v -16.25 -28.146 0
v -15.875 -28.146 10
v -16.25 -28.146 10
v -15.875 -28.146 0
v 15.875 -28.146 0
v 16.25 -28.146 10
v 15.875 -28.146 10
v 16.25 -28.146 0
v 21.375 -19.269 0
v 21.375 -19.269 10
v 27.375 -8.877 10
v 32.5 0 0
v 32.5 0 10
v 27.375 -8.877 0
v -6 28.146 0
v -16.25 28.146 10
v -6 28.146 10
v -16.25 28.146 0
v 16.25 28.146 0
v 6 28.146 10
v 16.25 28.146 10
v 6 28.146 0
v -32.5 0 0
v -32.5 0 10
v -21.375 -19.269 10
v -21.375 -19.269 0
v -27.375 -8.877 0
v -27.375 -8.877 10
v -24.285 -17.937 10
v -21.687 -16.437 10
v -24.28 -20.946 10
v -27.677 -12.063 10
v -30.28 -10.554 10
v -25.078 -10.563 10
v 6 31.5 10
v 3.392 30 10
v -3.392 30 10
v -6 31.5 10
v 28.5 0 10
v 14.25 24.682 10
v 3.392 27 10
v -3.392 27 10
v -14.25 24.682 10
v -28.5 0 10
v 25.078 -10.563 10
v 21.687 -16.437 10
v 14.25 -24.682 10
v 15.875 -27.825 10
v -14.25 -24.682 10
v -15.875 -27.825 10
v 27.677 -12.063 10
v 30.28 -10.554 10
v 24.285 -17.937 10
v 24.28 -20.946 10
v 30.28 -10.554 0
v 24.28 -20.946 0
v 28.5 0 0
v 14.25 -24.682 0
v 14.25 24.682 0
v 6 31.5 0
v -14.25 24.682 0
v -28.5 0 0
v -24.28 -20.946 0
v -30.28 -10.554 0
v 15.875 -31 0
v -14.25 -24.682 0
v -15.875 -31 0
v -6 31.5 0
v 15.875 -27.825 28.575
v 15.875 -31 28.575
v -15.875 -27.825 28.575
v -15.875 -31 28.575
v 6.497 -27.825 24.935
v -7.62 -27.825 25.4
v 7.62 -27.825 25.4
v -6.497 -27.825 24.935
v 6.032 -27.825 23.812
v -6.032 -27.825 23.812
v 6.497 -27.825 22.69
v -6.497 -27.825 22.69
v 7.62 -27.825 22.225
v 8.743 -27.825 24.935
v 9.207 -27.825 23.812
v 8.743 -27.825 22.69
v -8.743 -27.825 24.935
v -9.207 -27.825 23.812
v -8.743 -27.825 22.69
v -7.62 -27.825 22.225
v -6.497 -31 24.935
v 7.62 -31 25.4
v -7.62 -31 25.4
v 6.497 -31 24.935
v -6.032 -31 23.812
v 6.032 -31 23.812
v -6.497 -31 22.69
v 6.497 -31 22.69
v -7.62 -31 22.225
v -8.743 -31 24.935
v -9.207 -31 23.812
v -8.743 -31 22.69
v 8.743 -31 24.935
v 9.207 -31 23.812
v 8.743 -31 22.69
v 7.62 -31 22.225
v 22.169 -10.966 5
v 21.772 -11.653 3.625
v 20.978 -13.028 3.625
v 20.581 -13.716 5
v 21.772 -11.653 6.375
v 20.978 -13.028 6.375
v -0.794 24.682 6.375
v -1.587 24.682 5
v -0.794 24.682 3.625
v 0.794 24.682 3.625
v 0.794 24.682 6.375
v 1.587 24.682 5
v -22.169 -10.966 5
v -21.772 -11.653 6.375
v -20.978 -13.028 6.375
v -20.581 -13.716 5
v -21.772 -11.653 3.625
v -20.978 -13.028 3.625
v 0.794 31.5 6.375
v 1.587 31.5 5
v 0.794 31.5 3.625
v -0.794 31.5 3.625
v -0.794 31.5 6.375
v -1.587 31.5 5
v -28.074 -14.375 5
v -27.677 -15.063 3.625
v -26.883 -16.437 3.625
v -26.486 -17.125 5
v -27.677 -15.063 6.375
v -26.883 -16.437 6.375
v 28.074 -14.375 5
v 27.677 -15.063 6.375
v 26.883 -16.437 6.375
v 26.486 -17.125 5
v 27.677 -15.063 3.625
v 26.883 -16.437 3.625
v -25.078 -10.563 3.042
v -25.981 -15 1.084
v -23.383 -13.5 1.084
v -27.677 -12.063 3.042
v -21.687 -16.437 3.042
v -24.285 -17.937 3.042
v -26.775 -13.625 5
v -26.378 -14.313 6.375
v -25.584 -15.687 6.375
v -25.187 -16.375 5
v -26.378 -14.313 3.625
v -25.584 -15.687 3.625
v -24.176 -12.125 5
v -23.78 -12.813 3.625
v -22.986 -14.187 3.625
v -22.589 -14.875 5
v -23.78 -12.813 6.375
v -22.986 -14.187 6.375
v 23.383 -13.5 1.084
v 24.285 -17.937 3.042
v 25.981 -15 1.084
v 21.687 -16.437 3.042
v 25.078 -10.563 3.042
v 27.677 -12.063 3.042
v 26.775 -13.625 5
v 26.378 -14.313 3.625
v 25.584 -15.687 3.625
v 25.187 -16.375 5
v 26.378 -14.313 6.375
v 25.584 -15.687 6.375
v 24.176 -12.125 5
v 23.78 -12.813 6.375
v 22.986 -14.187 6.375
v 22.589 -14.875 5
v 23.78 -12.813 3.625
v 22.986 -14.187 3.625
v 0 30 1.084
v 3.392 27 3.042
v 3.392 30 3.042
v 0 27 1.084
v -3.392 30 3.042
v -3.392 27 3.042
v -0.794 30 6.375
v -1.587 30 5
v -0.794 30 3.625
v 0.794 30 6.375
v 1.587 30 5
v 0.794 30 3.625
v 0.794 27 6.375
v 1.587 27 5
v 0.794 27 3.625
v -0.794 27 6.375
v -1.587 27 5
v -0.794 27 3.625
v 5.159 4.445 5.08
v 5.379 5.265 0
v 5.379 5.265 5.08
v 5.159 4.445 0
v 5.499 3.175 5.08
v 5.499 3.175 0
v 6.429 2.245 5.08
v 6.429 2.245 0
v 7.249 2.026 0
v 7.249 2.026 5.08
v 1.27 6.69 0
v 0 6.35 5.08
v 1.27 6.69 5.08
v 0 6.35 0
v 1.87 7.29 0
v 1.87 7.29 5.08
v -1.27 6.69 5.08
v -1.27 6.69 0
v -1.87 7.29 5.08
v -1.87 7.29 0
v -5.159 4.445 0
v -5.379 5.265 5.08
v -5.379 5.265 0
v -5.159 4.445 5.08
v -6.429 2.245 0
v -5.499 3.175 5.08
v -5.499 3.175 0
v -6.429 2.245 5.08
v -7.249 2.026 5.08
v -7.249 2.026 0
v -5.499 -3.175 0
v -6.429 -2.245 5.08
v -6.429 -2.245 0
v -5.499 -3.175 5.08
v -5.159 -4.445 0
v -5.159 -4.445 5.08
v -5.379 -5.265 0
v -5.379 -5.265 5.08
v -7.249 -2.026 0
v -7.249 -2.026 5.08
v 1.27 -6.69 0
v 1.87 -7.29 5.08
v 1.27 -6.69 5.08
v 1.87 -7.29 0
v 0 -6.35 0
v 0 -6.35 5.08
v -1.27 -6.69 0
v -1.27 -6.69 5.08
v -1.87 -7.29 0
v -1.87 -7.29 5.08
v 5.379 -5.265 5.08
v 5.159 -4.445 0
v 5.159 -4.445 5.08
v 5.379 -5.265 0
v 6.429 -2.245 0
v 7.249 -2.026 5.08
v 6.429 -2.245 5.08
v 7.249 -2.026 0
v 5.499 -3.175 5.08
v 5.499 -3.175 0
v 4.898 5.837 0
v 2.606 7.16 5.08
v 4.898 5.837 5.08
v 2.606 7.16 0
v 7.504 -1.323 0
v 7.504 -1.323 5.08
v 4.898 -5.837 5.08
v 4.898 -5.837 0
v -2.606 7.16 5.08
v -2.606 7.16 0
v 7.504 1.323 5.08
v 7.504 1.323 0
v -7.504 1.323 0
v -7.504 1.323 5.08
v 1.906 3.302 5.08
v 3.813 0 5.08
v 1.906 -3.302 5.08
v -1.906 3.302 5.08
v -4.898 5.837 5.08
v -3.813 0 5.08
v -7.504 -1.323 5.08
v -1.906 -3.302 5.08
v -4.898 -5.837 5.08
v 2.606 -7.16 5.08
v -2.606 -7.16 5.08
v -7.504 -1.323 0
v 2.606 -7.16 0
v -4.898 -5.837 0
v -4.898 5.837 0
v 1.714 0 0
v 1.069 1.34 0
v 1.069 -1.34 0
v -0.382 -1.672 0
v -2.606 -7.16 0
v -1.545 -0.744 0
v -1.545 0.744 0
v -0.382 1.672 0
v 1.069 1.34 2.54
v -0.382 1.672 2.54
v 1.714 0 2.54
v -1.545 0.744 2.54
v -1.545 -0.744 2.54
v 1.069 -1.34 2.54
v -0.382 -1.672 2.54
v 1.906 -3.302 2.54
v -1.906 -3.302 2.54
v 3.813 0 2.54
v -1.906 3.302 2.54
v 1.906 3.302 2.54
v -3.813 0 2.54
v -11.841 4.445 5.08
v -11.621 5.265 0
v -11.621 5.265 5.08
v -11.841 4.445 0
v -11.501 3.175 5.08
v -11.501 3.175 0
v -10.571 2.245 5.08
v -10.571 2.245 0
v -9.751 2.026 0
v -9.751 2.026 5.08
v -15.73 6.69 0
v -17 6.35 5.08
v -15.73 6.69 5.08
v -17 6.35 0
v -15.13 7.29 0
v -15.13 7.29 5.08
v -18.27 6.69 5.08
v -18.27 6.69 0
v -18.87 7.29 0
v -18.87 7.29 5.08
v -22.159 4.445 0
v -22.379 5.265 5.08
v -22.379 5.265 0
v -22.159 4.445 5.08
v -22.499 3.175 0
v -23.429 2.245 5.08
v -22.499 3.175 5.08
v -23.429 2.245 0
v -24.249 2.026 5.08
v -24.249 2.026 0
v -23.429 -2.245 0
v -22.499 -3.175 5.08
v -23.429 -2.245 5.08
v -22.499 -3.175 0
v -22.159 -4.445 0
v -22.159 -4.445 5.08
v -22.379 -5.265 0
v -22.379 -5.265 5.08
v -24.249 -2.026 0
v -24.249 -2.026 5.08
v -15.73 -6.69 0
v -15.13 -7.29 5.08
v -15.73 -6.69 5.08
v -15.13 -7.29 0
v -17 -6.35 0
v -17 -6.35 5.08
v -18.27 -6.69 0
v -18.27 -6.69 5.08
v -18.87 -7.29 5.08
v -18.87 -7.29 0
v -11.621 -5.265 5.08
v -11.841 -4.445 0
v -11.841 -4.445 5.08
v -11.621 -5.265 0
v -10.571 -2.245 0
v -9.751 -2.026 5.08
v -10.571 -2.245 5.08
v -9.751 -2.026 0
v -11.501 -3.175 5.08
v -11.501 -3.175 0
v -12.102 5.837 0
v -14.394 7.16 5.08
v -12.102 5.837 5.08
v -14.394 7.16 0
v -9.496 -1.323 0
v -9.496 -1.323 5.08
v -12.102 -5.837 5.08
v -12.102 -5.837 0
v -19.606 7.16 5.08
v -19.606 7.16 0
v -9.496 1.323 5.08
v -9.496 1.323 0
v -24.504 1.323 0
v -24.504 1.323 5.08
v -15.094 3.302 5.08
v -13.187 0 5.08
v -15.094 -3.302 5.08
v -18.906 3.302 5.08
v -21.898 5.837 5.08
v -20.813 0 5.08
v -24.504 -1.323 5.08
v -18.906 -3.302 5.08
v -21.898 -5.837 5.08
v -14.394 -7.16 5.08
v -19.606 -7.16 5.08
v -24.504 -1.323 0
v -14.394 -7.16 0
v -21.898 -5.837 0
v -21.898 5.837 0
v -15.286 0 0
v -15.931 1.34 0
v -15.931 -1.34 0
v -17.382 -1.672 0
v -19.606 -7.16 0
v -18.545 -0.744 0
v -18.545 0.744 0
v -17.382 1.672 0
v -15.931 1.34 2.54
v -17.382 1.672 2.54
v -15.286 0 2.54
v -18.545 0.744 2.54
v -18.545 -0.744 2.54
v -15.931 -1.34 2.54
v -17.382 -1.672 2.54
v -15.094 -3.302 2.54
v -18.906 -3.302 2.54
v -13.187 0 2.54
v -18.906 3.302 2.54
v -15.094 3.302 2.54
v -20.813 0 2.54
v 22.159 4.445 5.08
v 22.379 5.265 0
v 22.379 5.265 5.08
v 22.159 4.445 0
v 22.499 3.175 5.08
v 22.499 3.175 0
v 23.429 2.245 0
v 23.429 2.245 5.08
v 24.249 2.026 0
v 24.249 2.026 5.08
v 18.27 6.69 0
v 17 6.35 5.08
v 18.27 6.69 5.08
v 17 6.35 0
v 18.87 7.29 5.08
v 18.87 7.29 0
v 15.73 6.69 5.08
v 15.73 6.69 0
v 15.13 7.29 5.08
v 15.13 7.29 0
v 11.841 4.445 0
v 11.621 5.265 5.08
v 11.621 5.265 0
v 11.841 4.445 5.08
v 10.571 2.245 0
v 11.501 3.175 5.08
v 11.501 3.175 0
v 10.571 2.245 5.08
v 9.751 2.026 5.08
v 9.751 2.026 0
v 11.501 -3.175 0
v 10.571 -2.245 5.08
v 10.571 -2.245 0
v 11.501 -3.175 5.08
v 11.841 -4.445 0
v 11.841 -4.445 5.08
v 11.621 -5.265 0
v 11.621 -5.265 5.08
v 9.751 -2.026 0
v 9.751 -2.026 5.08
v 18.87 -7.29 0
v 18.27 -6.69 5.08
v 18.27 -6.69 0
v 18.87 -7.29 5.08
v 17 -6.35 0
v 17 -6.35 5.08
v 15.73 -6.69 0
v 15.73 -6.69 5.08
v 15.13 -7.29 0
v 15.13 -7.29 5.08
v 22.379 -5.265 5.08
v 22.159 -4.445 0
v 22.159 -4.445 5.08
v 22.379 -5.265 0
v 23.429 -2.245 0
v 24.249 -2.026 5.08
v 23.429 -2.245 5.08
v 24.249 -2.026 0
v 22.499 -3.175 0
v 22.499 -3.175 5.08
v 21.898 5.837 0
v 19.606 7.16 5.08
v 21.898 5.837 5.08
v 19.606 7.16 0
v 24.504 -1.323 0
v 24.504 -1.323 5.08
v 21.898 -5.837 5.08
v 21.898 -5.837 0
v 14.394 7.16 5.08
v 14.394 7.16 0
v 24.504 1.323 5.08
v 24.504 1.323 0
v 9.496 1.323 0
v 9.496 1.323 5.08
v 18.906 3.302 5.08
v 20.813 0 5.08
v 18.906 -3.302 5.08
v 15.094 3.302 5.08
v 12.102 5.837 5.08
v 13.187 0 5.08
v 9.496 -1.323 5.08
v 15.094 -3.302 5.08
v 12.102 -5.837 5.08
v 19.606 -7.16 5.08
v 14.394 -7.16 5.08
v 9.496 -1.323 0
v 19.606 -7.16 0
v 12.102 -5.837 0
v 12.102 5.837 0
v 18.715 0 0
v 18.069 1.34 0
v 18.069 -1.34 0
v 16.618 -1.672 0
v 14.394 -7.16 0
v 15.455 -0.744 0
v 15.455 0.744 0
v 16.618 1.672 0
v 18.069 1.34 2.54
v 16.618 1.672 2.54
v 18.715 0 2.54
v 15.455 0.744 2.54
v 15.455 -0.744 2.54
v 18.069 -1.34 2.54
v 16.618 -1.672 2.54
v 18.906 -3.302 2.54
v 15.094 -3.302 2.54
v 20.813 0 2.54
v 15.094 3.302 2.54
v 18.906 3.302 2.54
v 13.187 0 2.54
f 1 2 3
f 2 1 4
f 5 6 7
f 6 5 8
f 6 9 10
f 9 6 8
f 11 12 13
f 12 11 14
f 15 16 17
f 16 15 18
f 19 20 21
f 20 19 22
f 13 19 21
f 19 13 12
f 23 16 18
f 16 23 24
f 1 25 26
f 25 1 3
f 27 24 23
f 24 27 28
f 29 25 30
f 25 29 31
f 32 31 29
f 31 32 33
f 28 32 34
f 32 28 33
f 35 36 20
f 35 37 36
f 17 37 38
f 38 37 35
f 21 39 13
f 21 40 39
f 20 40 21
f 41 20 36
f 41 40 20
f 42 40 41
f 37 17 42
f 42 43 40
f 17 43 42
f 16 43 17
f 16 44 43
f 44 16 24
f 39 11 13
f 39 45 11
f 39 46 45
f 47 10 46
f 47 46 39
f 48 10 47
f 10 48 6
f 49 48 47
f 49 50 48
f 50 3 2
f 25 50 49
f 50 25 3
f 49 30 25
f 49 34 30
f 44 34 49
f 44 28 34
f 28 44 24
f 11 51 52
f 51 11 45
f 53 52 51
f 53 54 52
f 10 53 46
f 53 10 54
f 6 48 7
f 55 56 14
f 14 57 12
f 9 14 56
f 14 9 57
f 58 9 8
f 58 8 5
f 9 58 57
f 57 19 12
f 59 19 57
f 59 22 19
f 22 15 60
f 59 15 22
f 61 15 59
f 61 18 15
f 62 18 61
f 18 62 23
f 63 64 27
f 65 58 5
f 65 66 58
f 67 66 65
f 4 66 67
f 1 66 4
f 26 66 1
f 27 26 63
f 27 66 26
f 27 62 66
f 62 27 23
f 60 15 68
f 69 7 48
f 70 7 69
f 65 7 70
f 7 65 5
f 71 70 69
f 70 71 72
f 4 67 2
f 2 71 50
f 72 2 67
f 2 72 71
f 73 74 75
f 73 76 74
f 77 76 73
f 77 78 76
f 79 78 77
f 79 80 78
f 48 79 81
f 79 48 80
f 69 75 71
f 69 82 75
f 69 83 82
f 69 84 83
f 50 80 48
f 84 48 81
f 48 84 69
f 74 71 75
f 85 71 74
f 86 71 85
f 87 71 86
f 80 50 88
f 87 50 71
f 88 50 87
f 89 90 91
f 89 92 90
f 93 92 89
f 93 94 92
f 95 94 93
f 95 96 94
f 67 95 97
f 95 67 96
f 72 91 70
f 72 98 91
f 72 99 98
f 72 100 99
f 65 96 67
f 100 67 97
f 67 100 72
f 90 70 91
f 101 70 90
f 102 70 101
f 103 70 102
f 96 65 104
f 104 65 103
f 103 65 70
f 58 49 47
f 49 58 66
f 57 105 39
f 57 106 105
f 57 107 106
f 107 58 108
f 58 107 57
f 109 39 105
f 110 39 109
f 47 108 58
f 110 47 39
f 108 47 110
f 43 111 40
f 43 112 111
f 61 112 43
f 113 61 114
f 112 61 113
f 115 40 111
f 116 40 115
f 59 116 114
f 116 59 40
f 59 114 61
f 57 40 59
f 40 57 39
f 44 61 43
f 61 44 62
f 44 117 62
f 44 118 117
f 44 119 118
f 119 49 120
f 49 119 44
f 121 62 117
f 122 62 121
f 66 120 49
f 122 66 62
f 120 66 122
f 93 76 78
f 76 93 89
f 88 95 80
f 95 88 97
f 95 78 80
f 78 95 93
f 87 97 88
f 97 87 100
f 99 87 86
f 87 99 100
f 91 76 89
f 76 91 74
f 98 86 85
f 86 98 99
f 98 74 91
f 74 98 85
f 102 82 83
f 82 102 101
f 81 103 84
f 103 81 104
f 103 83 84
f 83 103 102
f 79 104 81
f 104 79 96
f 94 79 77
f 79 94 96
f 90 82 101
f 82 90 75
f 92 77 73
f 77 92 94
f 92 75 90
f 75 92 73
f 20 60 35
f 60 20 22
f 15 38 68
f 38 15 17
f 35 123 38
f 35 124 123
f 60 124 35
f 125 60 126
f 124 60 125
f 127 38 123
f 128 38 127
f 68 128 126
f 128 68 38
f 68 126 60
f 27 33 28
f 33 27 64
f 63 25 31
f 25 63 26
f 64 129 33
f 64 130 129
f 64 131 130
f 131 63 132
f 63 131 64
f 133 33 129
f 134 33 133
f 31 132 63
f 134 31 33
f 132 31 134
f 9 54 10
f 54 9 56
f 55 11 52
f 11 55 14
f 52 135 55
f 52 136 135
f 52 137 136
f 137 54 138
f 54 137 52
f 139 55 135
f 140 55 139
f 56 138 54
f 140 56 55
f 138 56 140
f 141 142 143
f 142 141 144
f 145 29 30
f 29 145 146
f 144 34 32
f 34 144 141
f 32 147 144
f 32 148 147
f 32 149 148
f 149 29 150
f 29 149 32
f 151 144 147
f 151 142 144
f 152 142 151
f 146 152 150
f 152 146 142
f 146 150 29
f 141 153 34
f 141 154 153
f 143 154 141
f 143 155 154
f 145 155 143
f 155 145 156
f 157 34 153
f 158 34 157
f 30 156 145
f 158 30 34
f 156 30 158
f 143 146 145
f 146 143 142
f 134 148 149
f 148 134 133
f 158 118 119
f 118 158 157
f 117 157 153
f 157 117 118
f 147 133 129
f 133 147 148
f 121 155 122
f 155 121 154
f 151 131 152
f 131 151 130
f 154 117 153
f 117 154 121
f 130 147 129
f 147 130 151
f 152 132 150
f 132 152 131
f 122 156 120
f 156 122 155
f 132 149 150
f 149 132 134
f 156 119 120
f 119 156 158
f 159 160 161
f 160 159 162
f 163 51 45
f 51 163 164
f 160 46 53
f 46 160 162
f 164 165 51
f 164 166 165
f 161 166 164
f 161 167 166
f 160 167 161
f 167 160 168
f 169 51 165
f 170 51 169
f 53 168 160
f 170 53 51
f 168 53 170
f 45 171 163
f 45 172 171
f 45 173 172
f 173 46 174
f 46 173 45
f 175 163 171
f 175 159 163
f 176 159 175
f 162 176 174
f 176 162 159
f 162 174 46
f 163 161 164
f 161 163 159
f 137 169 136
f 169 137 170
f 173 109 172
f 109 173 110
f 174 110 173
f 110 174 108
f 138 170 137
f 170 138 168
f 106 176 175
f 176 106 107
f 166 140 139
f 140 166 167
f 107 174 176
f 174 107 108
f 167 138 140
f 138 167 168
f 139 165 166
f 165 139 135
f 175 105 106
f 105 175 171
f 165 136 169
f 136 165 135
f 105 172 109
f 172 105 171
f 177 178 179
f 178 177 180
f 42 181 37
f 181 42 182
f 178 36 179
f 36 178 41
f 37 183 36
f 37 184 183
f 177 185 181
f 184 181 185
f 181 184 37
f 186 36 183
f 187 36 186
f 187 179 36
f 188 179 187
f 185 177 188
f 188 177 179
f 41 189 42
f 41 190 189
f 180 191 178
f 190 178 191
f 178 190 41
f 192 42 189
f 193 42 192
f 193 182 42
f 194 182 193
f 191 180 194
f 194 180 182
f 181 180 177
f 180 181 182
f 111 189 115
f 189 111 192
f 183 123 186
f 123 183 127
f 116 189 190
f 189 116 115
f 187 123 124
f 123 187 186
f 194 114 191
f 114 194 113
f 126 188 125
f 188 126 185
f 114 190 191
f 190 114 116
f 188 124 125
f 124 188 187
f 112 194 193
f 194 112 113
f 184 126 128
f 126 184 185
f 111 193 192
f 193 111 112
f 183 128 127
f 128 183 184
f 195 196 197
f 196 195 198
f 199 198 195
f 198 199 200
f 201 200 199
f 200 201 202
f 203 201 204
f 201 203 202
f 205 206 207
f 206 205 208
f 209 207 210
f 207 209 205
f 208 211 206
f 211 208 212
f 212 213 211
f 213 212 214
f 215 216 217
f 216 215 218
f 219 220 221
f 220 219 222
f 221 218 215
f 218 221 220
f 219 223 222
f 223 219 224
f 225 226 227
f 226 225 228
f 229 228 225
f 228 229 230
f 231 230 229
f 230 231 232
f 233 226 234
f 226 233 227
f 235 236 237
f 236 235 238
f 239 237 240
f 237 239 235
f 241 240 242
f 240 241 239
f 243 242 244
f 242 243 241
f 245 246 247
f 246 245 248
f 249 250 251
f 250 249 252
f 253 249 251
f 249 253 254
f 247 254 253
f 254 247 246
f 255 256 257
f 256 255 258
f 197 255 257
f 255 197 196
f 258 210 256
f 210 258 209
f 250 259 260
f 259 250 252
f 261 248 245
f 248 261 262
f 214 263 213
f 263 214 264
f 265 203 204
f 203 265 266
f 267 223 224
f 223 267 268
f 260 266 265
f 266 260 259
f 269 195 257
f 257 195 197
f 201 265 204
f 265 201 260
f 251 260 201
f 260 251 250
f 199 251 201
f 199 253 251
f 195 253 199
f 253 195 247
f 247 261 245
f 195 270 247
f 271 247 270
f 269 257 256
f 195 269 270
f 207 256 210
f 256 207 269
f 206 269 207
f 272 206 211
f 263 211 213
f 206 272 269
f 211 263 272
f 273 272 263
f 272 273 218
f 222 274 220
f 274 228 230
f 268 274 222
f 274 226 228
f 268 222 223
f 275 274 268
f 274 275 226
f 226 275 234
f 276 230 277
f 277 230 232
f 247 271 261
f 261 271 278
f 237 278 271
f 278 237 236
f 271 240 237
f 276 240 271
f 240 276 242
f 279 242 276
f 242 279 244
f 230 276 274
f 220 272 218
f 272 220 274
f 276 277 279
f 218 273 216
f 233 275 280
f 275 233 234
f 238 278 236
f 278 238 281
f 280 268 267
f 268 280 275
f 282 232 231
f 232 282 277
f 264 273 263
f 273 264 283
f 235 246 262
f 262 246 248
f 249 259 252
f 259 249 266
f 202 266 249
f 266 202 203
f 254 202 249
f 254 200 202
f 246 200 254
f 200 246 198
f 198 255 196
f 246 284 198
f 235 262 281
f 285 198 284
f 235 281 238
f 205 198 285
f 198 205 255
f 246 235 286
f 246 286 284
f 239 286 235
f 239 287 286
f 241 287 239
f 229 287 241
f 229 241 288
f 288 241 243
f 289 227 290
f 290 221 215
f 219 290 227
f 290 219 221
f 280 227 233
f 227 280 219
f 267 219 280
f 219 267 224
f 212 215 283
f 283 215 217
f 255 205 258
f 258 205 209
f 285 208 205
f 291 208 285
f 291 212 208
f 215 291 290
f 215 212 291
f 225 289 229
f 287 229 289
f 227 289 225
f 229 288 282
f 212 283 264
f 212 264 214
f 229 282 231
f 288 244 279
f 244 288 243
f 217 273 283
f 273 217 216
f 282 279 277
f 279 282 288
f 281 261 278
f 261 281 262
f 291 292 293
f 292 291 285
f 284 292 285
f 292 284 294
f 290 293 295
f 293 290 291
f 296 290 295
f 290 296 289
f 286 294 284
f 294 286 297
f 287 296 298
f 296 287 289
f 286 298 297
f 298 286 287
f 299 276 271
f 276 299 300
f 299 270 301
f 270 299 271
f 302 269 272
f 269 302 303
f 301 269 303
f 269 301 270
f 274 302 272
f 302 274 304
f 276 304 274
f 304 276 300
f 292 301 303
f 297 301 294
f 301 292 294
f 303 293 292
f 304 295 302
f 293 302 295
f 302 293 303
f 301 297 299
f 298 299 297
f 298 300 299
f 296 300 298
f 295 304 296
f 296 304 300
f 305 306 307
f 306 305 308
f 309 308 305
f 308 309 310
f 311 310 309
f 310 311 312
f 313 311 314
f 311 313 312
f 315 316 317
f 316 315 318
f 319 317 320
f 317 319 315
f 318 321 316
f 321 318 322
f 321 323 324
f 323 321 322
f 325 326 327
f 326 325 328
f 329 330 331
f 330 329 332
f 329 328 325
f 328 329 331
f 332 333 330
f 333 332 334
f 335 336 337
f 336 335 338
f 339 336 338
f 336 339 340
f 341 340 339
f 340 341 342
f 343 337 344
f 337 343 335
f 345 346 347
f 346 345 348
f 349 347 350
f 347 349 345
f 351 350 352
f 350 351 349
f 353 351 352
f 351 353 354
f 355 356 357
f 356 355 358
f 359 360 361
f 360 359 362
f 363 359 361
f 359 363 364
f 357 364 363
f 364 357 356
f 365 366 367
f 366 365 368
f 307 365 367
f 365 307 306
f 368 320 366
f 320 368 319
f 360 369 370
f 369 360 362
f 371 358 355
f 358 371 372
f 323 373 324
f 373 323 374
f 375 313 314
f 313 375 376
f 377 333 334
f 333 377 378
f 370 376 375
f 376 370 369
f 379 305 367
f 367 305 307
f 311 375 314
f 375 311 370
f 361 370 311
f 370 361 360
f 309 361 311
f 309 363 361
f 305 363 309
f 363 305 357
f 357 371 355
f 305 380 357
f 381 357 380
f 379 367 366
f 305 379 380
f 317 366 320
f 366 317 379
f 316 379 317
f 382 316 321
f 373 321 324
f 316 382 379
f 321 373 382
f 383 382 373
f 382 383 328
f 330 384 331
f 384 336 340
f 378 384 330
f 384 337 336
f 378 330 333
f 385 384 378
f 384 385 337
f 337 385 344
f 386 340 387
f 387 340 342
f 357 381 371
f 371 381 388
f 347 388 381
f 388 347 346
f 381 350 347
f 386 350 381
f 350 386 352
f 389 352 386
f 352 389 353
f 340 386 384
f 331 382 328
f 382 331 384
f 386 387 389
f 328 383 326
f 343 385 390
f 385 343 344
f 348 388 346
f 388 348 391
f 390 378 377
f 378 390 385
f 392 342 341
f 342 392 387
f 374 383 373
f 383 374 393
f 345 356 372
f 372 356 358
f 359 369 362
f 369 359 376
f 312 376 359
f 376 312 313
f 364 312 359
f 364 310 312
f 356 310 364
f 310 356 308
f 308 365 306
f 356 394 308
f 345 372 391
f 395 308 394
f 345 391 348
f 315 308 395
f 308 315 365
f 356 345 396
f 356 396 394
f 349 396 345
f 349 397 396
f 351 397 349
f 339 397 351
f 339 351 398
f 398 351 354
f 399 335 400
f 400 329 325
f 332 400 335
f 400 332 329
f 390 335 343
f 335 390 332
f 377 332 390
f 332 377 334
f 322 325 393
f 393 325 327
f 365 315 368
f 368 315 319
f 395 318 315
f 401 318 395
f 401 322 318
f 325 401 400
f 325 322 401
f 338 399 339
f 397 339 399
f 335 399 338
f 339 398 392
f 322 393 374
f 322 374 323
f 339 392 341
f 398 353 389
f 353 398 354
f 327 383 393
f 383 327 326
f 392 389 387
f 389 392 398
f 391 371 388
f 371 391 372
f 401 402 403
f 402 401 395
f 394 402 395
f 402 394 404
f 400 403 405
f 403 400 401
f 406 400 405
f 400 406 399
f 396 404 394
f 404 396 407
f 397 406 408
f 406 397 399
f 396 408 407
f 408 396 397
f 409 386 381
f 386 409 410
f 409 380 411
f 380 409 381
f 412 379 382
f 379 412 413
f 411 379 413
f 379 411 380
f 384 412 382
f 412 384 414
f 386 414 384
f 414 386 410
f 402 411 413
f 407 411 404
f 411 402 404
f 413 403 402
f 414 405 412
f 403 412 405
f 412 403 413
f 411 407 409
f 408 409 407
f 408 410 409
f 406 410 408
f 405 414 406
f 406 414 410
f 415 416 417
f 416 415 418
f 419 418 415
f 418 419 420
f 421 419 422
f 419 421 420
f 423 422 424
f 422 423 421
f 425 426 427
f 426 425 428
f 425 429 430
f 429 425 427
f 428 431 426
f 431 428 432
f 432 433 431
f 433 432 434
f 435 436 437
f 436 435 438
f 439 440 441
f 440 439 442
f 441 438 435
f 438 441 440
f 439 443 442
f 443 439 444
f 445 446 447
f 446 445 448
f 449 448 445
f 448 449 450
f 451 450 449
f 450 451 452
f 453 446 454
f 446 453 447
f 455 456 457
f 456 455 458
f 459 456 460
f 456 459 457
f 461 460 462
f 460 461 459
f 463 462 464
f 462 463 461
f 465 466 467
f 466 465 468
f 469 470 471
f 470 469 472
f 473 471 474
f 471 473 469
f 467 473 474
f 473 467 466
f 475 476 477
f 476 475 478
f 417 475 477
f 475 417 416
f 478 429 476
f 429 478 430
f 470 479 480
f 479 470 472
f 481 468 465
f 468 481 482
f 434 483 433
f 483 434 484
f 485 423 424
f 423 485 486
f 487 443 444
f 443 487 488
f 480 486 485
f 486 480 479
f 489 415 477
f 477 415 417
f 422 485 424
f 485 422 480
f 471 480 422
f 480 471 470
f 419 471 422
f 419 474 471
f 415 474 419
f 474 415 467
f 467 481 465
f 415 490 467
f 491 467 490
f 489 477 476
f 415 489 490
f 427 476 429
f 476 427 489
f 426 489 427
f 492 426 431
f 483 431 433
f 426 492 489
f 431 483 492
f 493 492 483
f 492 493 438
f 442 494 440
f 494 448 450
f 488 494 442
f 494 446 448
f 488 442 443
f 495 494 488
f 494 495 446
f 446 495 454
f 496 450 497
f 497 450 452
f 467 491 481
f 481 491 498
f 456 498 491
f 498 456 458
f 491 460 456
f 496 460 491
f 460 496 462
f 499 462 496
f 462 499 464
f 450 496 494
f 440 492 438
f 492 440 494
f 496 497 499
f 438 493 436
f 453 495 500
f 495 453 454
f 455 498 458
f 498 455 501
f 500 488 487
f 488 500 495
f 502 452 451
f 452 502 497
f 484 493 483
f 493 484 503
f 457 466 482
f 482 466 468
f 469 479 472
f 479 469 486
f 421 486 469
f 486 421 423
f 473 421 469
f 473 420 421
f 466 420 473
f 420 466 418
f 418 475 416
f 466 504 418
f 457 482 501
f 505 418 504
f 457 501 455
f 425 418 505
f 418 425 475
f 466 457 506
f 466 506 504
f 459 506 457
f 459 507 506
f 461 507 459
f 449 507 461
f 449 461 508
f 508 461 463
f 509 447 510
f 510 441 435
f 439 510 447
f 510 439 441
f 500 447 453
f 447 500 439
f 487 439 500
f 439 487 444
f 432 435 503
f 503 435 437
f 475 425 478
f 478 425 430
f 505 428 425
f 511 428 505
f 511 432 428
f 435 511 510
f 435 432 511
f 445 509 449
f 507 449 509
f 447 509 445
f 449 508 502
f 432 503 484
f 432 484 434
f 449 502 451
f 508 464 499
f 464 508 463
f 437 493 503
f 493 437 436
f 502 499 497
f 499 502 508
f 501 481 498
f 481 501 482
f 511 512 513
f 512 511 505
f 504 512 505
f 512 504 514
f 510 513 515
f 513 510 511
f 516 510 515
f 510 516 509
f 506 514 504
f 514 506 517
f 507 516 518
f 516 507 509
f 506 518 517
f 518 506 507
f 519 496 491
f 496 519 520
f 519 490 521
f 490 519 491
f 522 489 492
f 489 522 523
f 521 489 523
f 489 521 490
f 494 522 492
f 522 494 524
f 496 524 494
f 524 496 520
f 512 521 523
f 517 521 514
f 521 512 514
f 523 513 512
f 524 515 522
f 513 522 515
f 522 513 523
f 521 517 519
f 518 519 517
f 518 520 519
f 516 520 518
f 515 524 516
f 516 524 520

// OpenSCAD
// file: thumbscrew.scad
//
// thumbscrew cap for #6-32 nut (5/16 wrench)
//
use <utils.scad>;
epsilon = 1;

module thumbscrew(size = "#6-32", height = -1)
{

  epsilon = 1;
  major_diam_table = [["#4-40", inch(0.6)],
                      ["#6-32", inch(0.6)]];                      
  thumbscrew_knurl_diameter_table = [["#4-40", inch(0.7)],
                                     ["#6-32", inch(0.7)]];
  thumbscrew_knurl_size_table = [["#4-40", inch(0.1)],
                                 ["#6-32", inch(0.1)]];
  thumbscrew_num_knurls_table = [["#4-40", 6],
                                 ["#6-32", 6]];
  thumbscrew_height_table = [["#4-40", inch(0.2)],
                             ["#6-32", inch(0.2)]];
  thumbscrew_base_thickness_table = [["#4-40", inch(0.1)],
                                     ["#6-32", inch(0.075)]];
  thumbscrew_wrench_size_table = [["#4-40", inch(1/4)],
                                  ["#6-32", inch(5/16)]];
  thumbscrew_wrench_tol_table = [["#4-40", inch(0.01)],
                                 ["#6-32", inch(0.01)]];
  screw_clearance_diameter_table = [["#4-40", inch(0.135)],
                                    ["#6-32", inch(0.165)]];


  thumbscrew_diameter = 
    major_diam_table[search([size], major_diam_table)[0]][1];

  thumbscrew_knurl_diameter =
    thumbscrew_knurl_diameter_table[search([size],
                                           thumbscrew_knurl_diameter_table)[0]][1];

  thumbscrew_knurl_size = 
    thumbscrew_knurl_size_table[search([size],
                                       thumbscrew_knurl_size_table)[0]][1];
  thumbscrew_num_knurls =
    thumbscrew_num_knurls_table[search([size],
                                       thumbscrew_num_knurls_table)[0]][1];
  thumbscrew_height = (height > 0) ? height :
    thumbscrew_height_table[search([size],
                                   thumbscrew_height_table)[0]][1];
  thumbscrew_base_thickness =
    thumbscrew_base_thickness_table[search([size],
                                           thumbscrew_base_thickness_table)[0]][1];
  thumbscrew_wrench_size =
    thumbscrew_wrench_size_table[search([size],
                                        thumbscrew_wrench_size_table)[0]][1];
  thumbscrew_wrench_tol =
    thumbscrew_wrench_tol_table[search([size],
                                       thumbscrew_wrench_tol_table)[0]][1];
  screw_clearance_diameter = 
    screw_clearance_diameter_table[search([size],
                                          screw_clearance_diameter_table)[0]][1];

  // calculation based on hex-shaped nut
  thumbscrew_nut_diameter = (thumbscrew_wrench_size +
                             thumbscrew_wrench_tol) / cos(30);

  difference()
  {
    // main body
    rotate([0, 0, 180/thumbscrew_num_knurls])
    {
      cylinder($fn=thumbscrew_num_knurls*3,
               r=thumbscrew_diameter/2,
               h=thumbscrew_height);
    }
    // thru hole
    translate([0, 0, -epsilon])
    {
      cylinder($fn=max(3, round(2*screw_clearance_diameter)),
               r=screw_clearance_diameter/2, h=inch(1));
    }
    // nut recess
    translate([0, 0, thumbscrew_base_thickness])
    {
      cylinder($fn=6, r=thumbscrew_nut_diameter/2, h=inch(1));
    }
    for(i = [0 : thumbscrew_num_knurls-1])
    {
      translate([0.5*thumbscrew_knurl_diameter*
                 cos(30+360*i/thumbscrew_num_knurls),
                 0.5*thumbscrew_knurl_diameter*
                 sin(30+360*i/thumbscrew_num_knurls),
                 -epsilon])
      {
        cylinder($fn=thumbscrew_num_knurls*2,
                 r = thumbscrew_knurl_size, inch(1.0));
      }
    }
  }
}

thumbscrew("#4-40");
// file: utils.scad
//
// general utility functions for OpenSCAD
//
function inch(in) = 25.4*in;
// main file
// ring mount for components
// Copyright (C) 2016, Theodore C Yapo

use <utils.scad>;
use <thumbscrew.scad>;


ring_length = 10;
//center_height = 14.5;
center_height = 31;
//outer_d = 2*center_height / cos(30);
outer_d = 65;
ring_thickness = 4;
inner_d = outer_d - 2*ring_thickness;
screw_spacing = inch(0.6);
base_width = inch(1.25);
base_thickness = inch(0.125);
base_length = inch(1.125);

nut_block_thickness = 6;
nut_block_width = 12;

// recesses for #4-40 hex nuts
nut_d = inch(0.25) / cos(30) + 0.5;
nut_h = 3;

set_screw_d = inch(0.125);

epsilon = 1;

module ring_mount(){
  difference(){
    union(){
      difference(){
        union(){
          //ring body
          cylinder($fn = 6, d = outer_d, h = ring_length);
          // base
          translate([-base_width/2, -center_height, 0]){
            cube([base_width, base_thickness, base_length]);
          }
        }
    
        // hollow inside
        translate([0, 0, -epsilon]){
          cylinder($fn = 6, d = inner_d, h = ring_length + 2*epsilon);
        }
    
        // mounting screw holes
        translate([-inch(0.6)/2,
                   -center_height-epsilon,
                   (base_length - inch(0.75))/2]){
          rotate([-90, 0, 0]){
            *cylinder($fn=8, d = inch(0.125), h = inch(0.25));
          }
        }
        translate([+inch(0.6)/2,
                   -center_height-epsilon,
                   (base_length - inch(0.75))/2]){
          rotate([-90, 0, 0]){
            *cylinder($fn=8, d = inch(0.125), h = inch(0.25));
          }
        }
        translate([-inch(0.6)/2,
                   -center_height - epsilon,
                   base_length - (base_length - inch(0.75))/2]){
          rotate([-90, 0, 0]){
            cylinder($fn=8, d = inch(0.125), h = inch(0.25));
          }
        }
        translate([+inch(0.6)/2,
                   -center_height - epsilon,
                   base_length - (base_length - inch(0.75))/2]){
          rotate([-90, 0, 0]){
            cylinder($fn=8, d = inch(0.125), h = inch(0.25));
          }
        }
      }
  
      // top nut block
      translate([-nut_block_width/2,
                 inner_d/2-nut_block_thickness/2,
                 0]){
        cube([nut_block_width, nut_block_thickness, ring_length]);
      }

      // left nut block
      rotate([0, 0, 120]){
        translate([-nut_block_width/2,
                   inner_d/2-nut_block_thickness/2,
                   0]){
          cube([nut_block_width, nut_block_thickness, ring_length]);
        }
      }

      // right nut block
      rotate([0, 0, -120]){
        translate([-nut_block_width/2,
                   inner_d/2-nut_block_thickness/2,
                   0]){
          cube([nut_block_width, nut_block_thickness, ring_length]);
        }
      }

    }

    // top nut recess
    translate([0,
               inner_d/2-nut_h/2,
               ring_length/2]){
      rotate([-90, 0, 0]){
        hull(){
          rotate([0, 0, 30]){
            cylinder($fn=6, d = nut_d, h = nut_h);
          }
          translate([0, -10, 0]){
            rotate([0, 0, 30]){
              cylinder($fn=6, d = nut_d, h = nut_h);
            }
          }
        }
      }
    }
    // top screw hole
    translate([0,
               inner_d/2 - ring_thickness,
               ring_length/2]){
      rotate([-90, 0, 0]){
        cylinder($fn=6, d = set_screw_d, h = 2*ring_thickness);
      }
    }

    // left nut recess
    rotate([0, 0, 120]){
      translate([0,
                 inner_d/2-nut_h/2,
                 ring_length/2]){
        rotate([-90, 0, 0]){
          hull(){
            rotate([0, 0, 30]){
              cylinder($fn=6, d = nut_d, h = nut_h);
            }
            translate([0, -10, 0]){
              rotate([0, 0, 30]){
                cylinder($fn=6, d = nut_d, h = nut_h);
              }
            }
          }
        }
      }
      // screw hole
      translate([0,
                 inner_d/2 - ring_thickness,
                 ring_length/2]){
        rotate([-90, 0, 0]){
          cylinder($fn=6, d = set_screw_d, h = 2*ring_thickness);
        }
      }
    }

    // right nut recess
    rotate([0, 0, -120]){
      translate([0,
                 inner_d/2-nut_h/2,
                 ring_length/2]){
        rotate([-90, 0, 0]){
          hull(){
            rotate([0, 0, 30]){
              cylinder($fn=6, d = nut_d, h = nut_h);
            }
            translate([0, -10, 0]){
              rotate([0, 0, 30]){
                cylinder($fn=6, d = nut_d, h = nut_h);
              }
            }
          }
        }
      }
      // screw hole
      translate([0,
                 inner_d/2 - ring_thickness,
                 ring_length/2]){
        rotate([-90, 0, 0]){
          cylinder($fn=6, d = set_screw_d, h = 2*ring_thickness);
        }
      }
    }
   
  }
}

module printing_layout()
{
  ring_mount();
  
  translate([-17, 0, 0]){
    thumbscrew(size = "#4-40");
  }
  translate([+17, 0, 0]){
    thumbscrew(size = "#4-40");
  }
  
  thumbscrew(size = "#4-40");
}

module ring_mount_assembly()
{
  ring_mount();
  
  translate([0, 25, ring_length/2]){
    rotate([-90, 0, 0]){
      thumbscrew(size = "#4-40");
    }
  }

  rotate([0, 0, 120]){
    translate([0, 25, ring_length/2]){
      rotate([-90, 0, 0]){
        thumbscrew(size = "#4-40");
      }
    }
  }

  rotate([0, 0, -120]){
    translate([0, 25, ring_length/2]){
      rotate([-90, 0, 0]){
        thumbscrew(size = "#4-40");
      }
    }
  }
}


printing_layout();
//ring_mount_assembly();
